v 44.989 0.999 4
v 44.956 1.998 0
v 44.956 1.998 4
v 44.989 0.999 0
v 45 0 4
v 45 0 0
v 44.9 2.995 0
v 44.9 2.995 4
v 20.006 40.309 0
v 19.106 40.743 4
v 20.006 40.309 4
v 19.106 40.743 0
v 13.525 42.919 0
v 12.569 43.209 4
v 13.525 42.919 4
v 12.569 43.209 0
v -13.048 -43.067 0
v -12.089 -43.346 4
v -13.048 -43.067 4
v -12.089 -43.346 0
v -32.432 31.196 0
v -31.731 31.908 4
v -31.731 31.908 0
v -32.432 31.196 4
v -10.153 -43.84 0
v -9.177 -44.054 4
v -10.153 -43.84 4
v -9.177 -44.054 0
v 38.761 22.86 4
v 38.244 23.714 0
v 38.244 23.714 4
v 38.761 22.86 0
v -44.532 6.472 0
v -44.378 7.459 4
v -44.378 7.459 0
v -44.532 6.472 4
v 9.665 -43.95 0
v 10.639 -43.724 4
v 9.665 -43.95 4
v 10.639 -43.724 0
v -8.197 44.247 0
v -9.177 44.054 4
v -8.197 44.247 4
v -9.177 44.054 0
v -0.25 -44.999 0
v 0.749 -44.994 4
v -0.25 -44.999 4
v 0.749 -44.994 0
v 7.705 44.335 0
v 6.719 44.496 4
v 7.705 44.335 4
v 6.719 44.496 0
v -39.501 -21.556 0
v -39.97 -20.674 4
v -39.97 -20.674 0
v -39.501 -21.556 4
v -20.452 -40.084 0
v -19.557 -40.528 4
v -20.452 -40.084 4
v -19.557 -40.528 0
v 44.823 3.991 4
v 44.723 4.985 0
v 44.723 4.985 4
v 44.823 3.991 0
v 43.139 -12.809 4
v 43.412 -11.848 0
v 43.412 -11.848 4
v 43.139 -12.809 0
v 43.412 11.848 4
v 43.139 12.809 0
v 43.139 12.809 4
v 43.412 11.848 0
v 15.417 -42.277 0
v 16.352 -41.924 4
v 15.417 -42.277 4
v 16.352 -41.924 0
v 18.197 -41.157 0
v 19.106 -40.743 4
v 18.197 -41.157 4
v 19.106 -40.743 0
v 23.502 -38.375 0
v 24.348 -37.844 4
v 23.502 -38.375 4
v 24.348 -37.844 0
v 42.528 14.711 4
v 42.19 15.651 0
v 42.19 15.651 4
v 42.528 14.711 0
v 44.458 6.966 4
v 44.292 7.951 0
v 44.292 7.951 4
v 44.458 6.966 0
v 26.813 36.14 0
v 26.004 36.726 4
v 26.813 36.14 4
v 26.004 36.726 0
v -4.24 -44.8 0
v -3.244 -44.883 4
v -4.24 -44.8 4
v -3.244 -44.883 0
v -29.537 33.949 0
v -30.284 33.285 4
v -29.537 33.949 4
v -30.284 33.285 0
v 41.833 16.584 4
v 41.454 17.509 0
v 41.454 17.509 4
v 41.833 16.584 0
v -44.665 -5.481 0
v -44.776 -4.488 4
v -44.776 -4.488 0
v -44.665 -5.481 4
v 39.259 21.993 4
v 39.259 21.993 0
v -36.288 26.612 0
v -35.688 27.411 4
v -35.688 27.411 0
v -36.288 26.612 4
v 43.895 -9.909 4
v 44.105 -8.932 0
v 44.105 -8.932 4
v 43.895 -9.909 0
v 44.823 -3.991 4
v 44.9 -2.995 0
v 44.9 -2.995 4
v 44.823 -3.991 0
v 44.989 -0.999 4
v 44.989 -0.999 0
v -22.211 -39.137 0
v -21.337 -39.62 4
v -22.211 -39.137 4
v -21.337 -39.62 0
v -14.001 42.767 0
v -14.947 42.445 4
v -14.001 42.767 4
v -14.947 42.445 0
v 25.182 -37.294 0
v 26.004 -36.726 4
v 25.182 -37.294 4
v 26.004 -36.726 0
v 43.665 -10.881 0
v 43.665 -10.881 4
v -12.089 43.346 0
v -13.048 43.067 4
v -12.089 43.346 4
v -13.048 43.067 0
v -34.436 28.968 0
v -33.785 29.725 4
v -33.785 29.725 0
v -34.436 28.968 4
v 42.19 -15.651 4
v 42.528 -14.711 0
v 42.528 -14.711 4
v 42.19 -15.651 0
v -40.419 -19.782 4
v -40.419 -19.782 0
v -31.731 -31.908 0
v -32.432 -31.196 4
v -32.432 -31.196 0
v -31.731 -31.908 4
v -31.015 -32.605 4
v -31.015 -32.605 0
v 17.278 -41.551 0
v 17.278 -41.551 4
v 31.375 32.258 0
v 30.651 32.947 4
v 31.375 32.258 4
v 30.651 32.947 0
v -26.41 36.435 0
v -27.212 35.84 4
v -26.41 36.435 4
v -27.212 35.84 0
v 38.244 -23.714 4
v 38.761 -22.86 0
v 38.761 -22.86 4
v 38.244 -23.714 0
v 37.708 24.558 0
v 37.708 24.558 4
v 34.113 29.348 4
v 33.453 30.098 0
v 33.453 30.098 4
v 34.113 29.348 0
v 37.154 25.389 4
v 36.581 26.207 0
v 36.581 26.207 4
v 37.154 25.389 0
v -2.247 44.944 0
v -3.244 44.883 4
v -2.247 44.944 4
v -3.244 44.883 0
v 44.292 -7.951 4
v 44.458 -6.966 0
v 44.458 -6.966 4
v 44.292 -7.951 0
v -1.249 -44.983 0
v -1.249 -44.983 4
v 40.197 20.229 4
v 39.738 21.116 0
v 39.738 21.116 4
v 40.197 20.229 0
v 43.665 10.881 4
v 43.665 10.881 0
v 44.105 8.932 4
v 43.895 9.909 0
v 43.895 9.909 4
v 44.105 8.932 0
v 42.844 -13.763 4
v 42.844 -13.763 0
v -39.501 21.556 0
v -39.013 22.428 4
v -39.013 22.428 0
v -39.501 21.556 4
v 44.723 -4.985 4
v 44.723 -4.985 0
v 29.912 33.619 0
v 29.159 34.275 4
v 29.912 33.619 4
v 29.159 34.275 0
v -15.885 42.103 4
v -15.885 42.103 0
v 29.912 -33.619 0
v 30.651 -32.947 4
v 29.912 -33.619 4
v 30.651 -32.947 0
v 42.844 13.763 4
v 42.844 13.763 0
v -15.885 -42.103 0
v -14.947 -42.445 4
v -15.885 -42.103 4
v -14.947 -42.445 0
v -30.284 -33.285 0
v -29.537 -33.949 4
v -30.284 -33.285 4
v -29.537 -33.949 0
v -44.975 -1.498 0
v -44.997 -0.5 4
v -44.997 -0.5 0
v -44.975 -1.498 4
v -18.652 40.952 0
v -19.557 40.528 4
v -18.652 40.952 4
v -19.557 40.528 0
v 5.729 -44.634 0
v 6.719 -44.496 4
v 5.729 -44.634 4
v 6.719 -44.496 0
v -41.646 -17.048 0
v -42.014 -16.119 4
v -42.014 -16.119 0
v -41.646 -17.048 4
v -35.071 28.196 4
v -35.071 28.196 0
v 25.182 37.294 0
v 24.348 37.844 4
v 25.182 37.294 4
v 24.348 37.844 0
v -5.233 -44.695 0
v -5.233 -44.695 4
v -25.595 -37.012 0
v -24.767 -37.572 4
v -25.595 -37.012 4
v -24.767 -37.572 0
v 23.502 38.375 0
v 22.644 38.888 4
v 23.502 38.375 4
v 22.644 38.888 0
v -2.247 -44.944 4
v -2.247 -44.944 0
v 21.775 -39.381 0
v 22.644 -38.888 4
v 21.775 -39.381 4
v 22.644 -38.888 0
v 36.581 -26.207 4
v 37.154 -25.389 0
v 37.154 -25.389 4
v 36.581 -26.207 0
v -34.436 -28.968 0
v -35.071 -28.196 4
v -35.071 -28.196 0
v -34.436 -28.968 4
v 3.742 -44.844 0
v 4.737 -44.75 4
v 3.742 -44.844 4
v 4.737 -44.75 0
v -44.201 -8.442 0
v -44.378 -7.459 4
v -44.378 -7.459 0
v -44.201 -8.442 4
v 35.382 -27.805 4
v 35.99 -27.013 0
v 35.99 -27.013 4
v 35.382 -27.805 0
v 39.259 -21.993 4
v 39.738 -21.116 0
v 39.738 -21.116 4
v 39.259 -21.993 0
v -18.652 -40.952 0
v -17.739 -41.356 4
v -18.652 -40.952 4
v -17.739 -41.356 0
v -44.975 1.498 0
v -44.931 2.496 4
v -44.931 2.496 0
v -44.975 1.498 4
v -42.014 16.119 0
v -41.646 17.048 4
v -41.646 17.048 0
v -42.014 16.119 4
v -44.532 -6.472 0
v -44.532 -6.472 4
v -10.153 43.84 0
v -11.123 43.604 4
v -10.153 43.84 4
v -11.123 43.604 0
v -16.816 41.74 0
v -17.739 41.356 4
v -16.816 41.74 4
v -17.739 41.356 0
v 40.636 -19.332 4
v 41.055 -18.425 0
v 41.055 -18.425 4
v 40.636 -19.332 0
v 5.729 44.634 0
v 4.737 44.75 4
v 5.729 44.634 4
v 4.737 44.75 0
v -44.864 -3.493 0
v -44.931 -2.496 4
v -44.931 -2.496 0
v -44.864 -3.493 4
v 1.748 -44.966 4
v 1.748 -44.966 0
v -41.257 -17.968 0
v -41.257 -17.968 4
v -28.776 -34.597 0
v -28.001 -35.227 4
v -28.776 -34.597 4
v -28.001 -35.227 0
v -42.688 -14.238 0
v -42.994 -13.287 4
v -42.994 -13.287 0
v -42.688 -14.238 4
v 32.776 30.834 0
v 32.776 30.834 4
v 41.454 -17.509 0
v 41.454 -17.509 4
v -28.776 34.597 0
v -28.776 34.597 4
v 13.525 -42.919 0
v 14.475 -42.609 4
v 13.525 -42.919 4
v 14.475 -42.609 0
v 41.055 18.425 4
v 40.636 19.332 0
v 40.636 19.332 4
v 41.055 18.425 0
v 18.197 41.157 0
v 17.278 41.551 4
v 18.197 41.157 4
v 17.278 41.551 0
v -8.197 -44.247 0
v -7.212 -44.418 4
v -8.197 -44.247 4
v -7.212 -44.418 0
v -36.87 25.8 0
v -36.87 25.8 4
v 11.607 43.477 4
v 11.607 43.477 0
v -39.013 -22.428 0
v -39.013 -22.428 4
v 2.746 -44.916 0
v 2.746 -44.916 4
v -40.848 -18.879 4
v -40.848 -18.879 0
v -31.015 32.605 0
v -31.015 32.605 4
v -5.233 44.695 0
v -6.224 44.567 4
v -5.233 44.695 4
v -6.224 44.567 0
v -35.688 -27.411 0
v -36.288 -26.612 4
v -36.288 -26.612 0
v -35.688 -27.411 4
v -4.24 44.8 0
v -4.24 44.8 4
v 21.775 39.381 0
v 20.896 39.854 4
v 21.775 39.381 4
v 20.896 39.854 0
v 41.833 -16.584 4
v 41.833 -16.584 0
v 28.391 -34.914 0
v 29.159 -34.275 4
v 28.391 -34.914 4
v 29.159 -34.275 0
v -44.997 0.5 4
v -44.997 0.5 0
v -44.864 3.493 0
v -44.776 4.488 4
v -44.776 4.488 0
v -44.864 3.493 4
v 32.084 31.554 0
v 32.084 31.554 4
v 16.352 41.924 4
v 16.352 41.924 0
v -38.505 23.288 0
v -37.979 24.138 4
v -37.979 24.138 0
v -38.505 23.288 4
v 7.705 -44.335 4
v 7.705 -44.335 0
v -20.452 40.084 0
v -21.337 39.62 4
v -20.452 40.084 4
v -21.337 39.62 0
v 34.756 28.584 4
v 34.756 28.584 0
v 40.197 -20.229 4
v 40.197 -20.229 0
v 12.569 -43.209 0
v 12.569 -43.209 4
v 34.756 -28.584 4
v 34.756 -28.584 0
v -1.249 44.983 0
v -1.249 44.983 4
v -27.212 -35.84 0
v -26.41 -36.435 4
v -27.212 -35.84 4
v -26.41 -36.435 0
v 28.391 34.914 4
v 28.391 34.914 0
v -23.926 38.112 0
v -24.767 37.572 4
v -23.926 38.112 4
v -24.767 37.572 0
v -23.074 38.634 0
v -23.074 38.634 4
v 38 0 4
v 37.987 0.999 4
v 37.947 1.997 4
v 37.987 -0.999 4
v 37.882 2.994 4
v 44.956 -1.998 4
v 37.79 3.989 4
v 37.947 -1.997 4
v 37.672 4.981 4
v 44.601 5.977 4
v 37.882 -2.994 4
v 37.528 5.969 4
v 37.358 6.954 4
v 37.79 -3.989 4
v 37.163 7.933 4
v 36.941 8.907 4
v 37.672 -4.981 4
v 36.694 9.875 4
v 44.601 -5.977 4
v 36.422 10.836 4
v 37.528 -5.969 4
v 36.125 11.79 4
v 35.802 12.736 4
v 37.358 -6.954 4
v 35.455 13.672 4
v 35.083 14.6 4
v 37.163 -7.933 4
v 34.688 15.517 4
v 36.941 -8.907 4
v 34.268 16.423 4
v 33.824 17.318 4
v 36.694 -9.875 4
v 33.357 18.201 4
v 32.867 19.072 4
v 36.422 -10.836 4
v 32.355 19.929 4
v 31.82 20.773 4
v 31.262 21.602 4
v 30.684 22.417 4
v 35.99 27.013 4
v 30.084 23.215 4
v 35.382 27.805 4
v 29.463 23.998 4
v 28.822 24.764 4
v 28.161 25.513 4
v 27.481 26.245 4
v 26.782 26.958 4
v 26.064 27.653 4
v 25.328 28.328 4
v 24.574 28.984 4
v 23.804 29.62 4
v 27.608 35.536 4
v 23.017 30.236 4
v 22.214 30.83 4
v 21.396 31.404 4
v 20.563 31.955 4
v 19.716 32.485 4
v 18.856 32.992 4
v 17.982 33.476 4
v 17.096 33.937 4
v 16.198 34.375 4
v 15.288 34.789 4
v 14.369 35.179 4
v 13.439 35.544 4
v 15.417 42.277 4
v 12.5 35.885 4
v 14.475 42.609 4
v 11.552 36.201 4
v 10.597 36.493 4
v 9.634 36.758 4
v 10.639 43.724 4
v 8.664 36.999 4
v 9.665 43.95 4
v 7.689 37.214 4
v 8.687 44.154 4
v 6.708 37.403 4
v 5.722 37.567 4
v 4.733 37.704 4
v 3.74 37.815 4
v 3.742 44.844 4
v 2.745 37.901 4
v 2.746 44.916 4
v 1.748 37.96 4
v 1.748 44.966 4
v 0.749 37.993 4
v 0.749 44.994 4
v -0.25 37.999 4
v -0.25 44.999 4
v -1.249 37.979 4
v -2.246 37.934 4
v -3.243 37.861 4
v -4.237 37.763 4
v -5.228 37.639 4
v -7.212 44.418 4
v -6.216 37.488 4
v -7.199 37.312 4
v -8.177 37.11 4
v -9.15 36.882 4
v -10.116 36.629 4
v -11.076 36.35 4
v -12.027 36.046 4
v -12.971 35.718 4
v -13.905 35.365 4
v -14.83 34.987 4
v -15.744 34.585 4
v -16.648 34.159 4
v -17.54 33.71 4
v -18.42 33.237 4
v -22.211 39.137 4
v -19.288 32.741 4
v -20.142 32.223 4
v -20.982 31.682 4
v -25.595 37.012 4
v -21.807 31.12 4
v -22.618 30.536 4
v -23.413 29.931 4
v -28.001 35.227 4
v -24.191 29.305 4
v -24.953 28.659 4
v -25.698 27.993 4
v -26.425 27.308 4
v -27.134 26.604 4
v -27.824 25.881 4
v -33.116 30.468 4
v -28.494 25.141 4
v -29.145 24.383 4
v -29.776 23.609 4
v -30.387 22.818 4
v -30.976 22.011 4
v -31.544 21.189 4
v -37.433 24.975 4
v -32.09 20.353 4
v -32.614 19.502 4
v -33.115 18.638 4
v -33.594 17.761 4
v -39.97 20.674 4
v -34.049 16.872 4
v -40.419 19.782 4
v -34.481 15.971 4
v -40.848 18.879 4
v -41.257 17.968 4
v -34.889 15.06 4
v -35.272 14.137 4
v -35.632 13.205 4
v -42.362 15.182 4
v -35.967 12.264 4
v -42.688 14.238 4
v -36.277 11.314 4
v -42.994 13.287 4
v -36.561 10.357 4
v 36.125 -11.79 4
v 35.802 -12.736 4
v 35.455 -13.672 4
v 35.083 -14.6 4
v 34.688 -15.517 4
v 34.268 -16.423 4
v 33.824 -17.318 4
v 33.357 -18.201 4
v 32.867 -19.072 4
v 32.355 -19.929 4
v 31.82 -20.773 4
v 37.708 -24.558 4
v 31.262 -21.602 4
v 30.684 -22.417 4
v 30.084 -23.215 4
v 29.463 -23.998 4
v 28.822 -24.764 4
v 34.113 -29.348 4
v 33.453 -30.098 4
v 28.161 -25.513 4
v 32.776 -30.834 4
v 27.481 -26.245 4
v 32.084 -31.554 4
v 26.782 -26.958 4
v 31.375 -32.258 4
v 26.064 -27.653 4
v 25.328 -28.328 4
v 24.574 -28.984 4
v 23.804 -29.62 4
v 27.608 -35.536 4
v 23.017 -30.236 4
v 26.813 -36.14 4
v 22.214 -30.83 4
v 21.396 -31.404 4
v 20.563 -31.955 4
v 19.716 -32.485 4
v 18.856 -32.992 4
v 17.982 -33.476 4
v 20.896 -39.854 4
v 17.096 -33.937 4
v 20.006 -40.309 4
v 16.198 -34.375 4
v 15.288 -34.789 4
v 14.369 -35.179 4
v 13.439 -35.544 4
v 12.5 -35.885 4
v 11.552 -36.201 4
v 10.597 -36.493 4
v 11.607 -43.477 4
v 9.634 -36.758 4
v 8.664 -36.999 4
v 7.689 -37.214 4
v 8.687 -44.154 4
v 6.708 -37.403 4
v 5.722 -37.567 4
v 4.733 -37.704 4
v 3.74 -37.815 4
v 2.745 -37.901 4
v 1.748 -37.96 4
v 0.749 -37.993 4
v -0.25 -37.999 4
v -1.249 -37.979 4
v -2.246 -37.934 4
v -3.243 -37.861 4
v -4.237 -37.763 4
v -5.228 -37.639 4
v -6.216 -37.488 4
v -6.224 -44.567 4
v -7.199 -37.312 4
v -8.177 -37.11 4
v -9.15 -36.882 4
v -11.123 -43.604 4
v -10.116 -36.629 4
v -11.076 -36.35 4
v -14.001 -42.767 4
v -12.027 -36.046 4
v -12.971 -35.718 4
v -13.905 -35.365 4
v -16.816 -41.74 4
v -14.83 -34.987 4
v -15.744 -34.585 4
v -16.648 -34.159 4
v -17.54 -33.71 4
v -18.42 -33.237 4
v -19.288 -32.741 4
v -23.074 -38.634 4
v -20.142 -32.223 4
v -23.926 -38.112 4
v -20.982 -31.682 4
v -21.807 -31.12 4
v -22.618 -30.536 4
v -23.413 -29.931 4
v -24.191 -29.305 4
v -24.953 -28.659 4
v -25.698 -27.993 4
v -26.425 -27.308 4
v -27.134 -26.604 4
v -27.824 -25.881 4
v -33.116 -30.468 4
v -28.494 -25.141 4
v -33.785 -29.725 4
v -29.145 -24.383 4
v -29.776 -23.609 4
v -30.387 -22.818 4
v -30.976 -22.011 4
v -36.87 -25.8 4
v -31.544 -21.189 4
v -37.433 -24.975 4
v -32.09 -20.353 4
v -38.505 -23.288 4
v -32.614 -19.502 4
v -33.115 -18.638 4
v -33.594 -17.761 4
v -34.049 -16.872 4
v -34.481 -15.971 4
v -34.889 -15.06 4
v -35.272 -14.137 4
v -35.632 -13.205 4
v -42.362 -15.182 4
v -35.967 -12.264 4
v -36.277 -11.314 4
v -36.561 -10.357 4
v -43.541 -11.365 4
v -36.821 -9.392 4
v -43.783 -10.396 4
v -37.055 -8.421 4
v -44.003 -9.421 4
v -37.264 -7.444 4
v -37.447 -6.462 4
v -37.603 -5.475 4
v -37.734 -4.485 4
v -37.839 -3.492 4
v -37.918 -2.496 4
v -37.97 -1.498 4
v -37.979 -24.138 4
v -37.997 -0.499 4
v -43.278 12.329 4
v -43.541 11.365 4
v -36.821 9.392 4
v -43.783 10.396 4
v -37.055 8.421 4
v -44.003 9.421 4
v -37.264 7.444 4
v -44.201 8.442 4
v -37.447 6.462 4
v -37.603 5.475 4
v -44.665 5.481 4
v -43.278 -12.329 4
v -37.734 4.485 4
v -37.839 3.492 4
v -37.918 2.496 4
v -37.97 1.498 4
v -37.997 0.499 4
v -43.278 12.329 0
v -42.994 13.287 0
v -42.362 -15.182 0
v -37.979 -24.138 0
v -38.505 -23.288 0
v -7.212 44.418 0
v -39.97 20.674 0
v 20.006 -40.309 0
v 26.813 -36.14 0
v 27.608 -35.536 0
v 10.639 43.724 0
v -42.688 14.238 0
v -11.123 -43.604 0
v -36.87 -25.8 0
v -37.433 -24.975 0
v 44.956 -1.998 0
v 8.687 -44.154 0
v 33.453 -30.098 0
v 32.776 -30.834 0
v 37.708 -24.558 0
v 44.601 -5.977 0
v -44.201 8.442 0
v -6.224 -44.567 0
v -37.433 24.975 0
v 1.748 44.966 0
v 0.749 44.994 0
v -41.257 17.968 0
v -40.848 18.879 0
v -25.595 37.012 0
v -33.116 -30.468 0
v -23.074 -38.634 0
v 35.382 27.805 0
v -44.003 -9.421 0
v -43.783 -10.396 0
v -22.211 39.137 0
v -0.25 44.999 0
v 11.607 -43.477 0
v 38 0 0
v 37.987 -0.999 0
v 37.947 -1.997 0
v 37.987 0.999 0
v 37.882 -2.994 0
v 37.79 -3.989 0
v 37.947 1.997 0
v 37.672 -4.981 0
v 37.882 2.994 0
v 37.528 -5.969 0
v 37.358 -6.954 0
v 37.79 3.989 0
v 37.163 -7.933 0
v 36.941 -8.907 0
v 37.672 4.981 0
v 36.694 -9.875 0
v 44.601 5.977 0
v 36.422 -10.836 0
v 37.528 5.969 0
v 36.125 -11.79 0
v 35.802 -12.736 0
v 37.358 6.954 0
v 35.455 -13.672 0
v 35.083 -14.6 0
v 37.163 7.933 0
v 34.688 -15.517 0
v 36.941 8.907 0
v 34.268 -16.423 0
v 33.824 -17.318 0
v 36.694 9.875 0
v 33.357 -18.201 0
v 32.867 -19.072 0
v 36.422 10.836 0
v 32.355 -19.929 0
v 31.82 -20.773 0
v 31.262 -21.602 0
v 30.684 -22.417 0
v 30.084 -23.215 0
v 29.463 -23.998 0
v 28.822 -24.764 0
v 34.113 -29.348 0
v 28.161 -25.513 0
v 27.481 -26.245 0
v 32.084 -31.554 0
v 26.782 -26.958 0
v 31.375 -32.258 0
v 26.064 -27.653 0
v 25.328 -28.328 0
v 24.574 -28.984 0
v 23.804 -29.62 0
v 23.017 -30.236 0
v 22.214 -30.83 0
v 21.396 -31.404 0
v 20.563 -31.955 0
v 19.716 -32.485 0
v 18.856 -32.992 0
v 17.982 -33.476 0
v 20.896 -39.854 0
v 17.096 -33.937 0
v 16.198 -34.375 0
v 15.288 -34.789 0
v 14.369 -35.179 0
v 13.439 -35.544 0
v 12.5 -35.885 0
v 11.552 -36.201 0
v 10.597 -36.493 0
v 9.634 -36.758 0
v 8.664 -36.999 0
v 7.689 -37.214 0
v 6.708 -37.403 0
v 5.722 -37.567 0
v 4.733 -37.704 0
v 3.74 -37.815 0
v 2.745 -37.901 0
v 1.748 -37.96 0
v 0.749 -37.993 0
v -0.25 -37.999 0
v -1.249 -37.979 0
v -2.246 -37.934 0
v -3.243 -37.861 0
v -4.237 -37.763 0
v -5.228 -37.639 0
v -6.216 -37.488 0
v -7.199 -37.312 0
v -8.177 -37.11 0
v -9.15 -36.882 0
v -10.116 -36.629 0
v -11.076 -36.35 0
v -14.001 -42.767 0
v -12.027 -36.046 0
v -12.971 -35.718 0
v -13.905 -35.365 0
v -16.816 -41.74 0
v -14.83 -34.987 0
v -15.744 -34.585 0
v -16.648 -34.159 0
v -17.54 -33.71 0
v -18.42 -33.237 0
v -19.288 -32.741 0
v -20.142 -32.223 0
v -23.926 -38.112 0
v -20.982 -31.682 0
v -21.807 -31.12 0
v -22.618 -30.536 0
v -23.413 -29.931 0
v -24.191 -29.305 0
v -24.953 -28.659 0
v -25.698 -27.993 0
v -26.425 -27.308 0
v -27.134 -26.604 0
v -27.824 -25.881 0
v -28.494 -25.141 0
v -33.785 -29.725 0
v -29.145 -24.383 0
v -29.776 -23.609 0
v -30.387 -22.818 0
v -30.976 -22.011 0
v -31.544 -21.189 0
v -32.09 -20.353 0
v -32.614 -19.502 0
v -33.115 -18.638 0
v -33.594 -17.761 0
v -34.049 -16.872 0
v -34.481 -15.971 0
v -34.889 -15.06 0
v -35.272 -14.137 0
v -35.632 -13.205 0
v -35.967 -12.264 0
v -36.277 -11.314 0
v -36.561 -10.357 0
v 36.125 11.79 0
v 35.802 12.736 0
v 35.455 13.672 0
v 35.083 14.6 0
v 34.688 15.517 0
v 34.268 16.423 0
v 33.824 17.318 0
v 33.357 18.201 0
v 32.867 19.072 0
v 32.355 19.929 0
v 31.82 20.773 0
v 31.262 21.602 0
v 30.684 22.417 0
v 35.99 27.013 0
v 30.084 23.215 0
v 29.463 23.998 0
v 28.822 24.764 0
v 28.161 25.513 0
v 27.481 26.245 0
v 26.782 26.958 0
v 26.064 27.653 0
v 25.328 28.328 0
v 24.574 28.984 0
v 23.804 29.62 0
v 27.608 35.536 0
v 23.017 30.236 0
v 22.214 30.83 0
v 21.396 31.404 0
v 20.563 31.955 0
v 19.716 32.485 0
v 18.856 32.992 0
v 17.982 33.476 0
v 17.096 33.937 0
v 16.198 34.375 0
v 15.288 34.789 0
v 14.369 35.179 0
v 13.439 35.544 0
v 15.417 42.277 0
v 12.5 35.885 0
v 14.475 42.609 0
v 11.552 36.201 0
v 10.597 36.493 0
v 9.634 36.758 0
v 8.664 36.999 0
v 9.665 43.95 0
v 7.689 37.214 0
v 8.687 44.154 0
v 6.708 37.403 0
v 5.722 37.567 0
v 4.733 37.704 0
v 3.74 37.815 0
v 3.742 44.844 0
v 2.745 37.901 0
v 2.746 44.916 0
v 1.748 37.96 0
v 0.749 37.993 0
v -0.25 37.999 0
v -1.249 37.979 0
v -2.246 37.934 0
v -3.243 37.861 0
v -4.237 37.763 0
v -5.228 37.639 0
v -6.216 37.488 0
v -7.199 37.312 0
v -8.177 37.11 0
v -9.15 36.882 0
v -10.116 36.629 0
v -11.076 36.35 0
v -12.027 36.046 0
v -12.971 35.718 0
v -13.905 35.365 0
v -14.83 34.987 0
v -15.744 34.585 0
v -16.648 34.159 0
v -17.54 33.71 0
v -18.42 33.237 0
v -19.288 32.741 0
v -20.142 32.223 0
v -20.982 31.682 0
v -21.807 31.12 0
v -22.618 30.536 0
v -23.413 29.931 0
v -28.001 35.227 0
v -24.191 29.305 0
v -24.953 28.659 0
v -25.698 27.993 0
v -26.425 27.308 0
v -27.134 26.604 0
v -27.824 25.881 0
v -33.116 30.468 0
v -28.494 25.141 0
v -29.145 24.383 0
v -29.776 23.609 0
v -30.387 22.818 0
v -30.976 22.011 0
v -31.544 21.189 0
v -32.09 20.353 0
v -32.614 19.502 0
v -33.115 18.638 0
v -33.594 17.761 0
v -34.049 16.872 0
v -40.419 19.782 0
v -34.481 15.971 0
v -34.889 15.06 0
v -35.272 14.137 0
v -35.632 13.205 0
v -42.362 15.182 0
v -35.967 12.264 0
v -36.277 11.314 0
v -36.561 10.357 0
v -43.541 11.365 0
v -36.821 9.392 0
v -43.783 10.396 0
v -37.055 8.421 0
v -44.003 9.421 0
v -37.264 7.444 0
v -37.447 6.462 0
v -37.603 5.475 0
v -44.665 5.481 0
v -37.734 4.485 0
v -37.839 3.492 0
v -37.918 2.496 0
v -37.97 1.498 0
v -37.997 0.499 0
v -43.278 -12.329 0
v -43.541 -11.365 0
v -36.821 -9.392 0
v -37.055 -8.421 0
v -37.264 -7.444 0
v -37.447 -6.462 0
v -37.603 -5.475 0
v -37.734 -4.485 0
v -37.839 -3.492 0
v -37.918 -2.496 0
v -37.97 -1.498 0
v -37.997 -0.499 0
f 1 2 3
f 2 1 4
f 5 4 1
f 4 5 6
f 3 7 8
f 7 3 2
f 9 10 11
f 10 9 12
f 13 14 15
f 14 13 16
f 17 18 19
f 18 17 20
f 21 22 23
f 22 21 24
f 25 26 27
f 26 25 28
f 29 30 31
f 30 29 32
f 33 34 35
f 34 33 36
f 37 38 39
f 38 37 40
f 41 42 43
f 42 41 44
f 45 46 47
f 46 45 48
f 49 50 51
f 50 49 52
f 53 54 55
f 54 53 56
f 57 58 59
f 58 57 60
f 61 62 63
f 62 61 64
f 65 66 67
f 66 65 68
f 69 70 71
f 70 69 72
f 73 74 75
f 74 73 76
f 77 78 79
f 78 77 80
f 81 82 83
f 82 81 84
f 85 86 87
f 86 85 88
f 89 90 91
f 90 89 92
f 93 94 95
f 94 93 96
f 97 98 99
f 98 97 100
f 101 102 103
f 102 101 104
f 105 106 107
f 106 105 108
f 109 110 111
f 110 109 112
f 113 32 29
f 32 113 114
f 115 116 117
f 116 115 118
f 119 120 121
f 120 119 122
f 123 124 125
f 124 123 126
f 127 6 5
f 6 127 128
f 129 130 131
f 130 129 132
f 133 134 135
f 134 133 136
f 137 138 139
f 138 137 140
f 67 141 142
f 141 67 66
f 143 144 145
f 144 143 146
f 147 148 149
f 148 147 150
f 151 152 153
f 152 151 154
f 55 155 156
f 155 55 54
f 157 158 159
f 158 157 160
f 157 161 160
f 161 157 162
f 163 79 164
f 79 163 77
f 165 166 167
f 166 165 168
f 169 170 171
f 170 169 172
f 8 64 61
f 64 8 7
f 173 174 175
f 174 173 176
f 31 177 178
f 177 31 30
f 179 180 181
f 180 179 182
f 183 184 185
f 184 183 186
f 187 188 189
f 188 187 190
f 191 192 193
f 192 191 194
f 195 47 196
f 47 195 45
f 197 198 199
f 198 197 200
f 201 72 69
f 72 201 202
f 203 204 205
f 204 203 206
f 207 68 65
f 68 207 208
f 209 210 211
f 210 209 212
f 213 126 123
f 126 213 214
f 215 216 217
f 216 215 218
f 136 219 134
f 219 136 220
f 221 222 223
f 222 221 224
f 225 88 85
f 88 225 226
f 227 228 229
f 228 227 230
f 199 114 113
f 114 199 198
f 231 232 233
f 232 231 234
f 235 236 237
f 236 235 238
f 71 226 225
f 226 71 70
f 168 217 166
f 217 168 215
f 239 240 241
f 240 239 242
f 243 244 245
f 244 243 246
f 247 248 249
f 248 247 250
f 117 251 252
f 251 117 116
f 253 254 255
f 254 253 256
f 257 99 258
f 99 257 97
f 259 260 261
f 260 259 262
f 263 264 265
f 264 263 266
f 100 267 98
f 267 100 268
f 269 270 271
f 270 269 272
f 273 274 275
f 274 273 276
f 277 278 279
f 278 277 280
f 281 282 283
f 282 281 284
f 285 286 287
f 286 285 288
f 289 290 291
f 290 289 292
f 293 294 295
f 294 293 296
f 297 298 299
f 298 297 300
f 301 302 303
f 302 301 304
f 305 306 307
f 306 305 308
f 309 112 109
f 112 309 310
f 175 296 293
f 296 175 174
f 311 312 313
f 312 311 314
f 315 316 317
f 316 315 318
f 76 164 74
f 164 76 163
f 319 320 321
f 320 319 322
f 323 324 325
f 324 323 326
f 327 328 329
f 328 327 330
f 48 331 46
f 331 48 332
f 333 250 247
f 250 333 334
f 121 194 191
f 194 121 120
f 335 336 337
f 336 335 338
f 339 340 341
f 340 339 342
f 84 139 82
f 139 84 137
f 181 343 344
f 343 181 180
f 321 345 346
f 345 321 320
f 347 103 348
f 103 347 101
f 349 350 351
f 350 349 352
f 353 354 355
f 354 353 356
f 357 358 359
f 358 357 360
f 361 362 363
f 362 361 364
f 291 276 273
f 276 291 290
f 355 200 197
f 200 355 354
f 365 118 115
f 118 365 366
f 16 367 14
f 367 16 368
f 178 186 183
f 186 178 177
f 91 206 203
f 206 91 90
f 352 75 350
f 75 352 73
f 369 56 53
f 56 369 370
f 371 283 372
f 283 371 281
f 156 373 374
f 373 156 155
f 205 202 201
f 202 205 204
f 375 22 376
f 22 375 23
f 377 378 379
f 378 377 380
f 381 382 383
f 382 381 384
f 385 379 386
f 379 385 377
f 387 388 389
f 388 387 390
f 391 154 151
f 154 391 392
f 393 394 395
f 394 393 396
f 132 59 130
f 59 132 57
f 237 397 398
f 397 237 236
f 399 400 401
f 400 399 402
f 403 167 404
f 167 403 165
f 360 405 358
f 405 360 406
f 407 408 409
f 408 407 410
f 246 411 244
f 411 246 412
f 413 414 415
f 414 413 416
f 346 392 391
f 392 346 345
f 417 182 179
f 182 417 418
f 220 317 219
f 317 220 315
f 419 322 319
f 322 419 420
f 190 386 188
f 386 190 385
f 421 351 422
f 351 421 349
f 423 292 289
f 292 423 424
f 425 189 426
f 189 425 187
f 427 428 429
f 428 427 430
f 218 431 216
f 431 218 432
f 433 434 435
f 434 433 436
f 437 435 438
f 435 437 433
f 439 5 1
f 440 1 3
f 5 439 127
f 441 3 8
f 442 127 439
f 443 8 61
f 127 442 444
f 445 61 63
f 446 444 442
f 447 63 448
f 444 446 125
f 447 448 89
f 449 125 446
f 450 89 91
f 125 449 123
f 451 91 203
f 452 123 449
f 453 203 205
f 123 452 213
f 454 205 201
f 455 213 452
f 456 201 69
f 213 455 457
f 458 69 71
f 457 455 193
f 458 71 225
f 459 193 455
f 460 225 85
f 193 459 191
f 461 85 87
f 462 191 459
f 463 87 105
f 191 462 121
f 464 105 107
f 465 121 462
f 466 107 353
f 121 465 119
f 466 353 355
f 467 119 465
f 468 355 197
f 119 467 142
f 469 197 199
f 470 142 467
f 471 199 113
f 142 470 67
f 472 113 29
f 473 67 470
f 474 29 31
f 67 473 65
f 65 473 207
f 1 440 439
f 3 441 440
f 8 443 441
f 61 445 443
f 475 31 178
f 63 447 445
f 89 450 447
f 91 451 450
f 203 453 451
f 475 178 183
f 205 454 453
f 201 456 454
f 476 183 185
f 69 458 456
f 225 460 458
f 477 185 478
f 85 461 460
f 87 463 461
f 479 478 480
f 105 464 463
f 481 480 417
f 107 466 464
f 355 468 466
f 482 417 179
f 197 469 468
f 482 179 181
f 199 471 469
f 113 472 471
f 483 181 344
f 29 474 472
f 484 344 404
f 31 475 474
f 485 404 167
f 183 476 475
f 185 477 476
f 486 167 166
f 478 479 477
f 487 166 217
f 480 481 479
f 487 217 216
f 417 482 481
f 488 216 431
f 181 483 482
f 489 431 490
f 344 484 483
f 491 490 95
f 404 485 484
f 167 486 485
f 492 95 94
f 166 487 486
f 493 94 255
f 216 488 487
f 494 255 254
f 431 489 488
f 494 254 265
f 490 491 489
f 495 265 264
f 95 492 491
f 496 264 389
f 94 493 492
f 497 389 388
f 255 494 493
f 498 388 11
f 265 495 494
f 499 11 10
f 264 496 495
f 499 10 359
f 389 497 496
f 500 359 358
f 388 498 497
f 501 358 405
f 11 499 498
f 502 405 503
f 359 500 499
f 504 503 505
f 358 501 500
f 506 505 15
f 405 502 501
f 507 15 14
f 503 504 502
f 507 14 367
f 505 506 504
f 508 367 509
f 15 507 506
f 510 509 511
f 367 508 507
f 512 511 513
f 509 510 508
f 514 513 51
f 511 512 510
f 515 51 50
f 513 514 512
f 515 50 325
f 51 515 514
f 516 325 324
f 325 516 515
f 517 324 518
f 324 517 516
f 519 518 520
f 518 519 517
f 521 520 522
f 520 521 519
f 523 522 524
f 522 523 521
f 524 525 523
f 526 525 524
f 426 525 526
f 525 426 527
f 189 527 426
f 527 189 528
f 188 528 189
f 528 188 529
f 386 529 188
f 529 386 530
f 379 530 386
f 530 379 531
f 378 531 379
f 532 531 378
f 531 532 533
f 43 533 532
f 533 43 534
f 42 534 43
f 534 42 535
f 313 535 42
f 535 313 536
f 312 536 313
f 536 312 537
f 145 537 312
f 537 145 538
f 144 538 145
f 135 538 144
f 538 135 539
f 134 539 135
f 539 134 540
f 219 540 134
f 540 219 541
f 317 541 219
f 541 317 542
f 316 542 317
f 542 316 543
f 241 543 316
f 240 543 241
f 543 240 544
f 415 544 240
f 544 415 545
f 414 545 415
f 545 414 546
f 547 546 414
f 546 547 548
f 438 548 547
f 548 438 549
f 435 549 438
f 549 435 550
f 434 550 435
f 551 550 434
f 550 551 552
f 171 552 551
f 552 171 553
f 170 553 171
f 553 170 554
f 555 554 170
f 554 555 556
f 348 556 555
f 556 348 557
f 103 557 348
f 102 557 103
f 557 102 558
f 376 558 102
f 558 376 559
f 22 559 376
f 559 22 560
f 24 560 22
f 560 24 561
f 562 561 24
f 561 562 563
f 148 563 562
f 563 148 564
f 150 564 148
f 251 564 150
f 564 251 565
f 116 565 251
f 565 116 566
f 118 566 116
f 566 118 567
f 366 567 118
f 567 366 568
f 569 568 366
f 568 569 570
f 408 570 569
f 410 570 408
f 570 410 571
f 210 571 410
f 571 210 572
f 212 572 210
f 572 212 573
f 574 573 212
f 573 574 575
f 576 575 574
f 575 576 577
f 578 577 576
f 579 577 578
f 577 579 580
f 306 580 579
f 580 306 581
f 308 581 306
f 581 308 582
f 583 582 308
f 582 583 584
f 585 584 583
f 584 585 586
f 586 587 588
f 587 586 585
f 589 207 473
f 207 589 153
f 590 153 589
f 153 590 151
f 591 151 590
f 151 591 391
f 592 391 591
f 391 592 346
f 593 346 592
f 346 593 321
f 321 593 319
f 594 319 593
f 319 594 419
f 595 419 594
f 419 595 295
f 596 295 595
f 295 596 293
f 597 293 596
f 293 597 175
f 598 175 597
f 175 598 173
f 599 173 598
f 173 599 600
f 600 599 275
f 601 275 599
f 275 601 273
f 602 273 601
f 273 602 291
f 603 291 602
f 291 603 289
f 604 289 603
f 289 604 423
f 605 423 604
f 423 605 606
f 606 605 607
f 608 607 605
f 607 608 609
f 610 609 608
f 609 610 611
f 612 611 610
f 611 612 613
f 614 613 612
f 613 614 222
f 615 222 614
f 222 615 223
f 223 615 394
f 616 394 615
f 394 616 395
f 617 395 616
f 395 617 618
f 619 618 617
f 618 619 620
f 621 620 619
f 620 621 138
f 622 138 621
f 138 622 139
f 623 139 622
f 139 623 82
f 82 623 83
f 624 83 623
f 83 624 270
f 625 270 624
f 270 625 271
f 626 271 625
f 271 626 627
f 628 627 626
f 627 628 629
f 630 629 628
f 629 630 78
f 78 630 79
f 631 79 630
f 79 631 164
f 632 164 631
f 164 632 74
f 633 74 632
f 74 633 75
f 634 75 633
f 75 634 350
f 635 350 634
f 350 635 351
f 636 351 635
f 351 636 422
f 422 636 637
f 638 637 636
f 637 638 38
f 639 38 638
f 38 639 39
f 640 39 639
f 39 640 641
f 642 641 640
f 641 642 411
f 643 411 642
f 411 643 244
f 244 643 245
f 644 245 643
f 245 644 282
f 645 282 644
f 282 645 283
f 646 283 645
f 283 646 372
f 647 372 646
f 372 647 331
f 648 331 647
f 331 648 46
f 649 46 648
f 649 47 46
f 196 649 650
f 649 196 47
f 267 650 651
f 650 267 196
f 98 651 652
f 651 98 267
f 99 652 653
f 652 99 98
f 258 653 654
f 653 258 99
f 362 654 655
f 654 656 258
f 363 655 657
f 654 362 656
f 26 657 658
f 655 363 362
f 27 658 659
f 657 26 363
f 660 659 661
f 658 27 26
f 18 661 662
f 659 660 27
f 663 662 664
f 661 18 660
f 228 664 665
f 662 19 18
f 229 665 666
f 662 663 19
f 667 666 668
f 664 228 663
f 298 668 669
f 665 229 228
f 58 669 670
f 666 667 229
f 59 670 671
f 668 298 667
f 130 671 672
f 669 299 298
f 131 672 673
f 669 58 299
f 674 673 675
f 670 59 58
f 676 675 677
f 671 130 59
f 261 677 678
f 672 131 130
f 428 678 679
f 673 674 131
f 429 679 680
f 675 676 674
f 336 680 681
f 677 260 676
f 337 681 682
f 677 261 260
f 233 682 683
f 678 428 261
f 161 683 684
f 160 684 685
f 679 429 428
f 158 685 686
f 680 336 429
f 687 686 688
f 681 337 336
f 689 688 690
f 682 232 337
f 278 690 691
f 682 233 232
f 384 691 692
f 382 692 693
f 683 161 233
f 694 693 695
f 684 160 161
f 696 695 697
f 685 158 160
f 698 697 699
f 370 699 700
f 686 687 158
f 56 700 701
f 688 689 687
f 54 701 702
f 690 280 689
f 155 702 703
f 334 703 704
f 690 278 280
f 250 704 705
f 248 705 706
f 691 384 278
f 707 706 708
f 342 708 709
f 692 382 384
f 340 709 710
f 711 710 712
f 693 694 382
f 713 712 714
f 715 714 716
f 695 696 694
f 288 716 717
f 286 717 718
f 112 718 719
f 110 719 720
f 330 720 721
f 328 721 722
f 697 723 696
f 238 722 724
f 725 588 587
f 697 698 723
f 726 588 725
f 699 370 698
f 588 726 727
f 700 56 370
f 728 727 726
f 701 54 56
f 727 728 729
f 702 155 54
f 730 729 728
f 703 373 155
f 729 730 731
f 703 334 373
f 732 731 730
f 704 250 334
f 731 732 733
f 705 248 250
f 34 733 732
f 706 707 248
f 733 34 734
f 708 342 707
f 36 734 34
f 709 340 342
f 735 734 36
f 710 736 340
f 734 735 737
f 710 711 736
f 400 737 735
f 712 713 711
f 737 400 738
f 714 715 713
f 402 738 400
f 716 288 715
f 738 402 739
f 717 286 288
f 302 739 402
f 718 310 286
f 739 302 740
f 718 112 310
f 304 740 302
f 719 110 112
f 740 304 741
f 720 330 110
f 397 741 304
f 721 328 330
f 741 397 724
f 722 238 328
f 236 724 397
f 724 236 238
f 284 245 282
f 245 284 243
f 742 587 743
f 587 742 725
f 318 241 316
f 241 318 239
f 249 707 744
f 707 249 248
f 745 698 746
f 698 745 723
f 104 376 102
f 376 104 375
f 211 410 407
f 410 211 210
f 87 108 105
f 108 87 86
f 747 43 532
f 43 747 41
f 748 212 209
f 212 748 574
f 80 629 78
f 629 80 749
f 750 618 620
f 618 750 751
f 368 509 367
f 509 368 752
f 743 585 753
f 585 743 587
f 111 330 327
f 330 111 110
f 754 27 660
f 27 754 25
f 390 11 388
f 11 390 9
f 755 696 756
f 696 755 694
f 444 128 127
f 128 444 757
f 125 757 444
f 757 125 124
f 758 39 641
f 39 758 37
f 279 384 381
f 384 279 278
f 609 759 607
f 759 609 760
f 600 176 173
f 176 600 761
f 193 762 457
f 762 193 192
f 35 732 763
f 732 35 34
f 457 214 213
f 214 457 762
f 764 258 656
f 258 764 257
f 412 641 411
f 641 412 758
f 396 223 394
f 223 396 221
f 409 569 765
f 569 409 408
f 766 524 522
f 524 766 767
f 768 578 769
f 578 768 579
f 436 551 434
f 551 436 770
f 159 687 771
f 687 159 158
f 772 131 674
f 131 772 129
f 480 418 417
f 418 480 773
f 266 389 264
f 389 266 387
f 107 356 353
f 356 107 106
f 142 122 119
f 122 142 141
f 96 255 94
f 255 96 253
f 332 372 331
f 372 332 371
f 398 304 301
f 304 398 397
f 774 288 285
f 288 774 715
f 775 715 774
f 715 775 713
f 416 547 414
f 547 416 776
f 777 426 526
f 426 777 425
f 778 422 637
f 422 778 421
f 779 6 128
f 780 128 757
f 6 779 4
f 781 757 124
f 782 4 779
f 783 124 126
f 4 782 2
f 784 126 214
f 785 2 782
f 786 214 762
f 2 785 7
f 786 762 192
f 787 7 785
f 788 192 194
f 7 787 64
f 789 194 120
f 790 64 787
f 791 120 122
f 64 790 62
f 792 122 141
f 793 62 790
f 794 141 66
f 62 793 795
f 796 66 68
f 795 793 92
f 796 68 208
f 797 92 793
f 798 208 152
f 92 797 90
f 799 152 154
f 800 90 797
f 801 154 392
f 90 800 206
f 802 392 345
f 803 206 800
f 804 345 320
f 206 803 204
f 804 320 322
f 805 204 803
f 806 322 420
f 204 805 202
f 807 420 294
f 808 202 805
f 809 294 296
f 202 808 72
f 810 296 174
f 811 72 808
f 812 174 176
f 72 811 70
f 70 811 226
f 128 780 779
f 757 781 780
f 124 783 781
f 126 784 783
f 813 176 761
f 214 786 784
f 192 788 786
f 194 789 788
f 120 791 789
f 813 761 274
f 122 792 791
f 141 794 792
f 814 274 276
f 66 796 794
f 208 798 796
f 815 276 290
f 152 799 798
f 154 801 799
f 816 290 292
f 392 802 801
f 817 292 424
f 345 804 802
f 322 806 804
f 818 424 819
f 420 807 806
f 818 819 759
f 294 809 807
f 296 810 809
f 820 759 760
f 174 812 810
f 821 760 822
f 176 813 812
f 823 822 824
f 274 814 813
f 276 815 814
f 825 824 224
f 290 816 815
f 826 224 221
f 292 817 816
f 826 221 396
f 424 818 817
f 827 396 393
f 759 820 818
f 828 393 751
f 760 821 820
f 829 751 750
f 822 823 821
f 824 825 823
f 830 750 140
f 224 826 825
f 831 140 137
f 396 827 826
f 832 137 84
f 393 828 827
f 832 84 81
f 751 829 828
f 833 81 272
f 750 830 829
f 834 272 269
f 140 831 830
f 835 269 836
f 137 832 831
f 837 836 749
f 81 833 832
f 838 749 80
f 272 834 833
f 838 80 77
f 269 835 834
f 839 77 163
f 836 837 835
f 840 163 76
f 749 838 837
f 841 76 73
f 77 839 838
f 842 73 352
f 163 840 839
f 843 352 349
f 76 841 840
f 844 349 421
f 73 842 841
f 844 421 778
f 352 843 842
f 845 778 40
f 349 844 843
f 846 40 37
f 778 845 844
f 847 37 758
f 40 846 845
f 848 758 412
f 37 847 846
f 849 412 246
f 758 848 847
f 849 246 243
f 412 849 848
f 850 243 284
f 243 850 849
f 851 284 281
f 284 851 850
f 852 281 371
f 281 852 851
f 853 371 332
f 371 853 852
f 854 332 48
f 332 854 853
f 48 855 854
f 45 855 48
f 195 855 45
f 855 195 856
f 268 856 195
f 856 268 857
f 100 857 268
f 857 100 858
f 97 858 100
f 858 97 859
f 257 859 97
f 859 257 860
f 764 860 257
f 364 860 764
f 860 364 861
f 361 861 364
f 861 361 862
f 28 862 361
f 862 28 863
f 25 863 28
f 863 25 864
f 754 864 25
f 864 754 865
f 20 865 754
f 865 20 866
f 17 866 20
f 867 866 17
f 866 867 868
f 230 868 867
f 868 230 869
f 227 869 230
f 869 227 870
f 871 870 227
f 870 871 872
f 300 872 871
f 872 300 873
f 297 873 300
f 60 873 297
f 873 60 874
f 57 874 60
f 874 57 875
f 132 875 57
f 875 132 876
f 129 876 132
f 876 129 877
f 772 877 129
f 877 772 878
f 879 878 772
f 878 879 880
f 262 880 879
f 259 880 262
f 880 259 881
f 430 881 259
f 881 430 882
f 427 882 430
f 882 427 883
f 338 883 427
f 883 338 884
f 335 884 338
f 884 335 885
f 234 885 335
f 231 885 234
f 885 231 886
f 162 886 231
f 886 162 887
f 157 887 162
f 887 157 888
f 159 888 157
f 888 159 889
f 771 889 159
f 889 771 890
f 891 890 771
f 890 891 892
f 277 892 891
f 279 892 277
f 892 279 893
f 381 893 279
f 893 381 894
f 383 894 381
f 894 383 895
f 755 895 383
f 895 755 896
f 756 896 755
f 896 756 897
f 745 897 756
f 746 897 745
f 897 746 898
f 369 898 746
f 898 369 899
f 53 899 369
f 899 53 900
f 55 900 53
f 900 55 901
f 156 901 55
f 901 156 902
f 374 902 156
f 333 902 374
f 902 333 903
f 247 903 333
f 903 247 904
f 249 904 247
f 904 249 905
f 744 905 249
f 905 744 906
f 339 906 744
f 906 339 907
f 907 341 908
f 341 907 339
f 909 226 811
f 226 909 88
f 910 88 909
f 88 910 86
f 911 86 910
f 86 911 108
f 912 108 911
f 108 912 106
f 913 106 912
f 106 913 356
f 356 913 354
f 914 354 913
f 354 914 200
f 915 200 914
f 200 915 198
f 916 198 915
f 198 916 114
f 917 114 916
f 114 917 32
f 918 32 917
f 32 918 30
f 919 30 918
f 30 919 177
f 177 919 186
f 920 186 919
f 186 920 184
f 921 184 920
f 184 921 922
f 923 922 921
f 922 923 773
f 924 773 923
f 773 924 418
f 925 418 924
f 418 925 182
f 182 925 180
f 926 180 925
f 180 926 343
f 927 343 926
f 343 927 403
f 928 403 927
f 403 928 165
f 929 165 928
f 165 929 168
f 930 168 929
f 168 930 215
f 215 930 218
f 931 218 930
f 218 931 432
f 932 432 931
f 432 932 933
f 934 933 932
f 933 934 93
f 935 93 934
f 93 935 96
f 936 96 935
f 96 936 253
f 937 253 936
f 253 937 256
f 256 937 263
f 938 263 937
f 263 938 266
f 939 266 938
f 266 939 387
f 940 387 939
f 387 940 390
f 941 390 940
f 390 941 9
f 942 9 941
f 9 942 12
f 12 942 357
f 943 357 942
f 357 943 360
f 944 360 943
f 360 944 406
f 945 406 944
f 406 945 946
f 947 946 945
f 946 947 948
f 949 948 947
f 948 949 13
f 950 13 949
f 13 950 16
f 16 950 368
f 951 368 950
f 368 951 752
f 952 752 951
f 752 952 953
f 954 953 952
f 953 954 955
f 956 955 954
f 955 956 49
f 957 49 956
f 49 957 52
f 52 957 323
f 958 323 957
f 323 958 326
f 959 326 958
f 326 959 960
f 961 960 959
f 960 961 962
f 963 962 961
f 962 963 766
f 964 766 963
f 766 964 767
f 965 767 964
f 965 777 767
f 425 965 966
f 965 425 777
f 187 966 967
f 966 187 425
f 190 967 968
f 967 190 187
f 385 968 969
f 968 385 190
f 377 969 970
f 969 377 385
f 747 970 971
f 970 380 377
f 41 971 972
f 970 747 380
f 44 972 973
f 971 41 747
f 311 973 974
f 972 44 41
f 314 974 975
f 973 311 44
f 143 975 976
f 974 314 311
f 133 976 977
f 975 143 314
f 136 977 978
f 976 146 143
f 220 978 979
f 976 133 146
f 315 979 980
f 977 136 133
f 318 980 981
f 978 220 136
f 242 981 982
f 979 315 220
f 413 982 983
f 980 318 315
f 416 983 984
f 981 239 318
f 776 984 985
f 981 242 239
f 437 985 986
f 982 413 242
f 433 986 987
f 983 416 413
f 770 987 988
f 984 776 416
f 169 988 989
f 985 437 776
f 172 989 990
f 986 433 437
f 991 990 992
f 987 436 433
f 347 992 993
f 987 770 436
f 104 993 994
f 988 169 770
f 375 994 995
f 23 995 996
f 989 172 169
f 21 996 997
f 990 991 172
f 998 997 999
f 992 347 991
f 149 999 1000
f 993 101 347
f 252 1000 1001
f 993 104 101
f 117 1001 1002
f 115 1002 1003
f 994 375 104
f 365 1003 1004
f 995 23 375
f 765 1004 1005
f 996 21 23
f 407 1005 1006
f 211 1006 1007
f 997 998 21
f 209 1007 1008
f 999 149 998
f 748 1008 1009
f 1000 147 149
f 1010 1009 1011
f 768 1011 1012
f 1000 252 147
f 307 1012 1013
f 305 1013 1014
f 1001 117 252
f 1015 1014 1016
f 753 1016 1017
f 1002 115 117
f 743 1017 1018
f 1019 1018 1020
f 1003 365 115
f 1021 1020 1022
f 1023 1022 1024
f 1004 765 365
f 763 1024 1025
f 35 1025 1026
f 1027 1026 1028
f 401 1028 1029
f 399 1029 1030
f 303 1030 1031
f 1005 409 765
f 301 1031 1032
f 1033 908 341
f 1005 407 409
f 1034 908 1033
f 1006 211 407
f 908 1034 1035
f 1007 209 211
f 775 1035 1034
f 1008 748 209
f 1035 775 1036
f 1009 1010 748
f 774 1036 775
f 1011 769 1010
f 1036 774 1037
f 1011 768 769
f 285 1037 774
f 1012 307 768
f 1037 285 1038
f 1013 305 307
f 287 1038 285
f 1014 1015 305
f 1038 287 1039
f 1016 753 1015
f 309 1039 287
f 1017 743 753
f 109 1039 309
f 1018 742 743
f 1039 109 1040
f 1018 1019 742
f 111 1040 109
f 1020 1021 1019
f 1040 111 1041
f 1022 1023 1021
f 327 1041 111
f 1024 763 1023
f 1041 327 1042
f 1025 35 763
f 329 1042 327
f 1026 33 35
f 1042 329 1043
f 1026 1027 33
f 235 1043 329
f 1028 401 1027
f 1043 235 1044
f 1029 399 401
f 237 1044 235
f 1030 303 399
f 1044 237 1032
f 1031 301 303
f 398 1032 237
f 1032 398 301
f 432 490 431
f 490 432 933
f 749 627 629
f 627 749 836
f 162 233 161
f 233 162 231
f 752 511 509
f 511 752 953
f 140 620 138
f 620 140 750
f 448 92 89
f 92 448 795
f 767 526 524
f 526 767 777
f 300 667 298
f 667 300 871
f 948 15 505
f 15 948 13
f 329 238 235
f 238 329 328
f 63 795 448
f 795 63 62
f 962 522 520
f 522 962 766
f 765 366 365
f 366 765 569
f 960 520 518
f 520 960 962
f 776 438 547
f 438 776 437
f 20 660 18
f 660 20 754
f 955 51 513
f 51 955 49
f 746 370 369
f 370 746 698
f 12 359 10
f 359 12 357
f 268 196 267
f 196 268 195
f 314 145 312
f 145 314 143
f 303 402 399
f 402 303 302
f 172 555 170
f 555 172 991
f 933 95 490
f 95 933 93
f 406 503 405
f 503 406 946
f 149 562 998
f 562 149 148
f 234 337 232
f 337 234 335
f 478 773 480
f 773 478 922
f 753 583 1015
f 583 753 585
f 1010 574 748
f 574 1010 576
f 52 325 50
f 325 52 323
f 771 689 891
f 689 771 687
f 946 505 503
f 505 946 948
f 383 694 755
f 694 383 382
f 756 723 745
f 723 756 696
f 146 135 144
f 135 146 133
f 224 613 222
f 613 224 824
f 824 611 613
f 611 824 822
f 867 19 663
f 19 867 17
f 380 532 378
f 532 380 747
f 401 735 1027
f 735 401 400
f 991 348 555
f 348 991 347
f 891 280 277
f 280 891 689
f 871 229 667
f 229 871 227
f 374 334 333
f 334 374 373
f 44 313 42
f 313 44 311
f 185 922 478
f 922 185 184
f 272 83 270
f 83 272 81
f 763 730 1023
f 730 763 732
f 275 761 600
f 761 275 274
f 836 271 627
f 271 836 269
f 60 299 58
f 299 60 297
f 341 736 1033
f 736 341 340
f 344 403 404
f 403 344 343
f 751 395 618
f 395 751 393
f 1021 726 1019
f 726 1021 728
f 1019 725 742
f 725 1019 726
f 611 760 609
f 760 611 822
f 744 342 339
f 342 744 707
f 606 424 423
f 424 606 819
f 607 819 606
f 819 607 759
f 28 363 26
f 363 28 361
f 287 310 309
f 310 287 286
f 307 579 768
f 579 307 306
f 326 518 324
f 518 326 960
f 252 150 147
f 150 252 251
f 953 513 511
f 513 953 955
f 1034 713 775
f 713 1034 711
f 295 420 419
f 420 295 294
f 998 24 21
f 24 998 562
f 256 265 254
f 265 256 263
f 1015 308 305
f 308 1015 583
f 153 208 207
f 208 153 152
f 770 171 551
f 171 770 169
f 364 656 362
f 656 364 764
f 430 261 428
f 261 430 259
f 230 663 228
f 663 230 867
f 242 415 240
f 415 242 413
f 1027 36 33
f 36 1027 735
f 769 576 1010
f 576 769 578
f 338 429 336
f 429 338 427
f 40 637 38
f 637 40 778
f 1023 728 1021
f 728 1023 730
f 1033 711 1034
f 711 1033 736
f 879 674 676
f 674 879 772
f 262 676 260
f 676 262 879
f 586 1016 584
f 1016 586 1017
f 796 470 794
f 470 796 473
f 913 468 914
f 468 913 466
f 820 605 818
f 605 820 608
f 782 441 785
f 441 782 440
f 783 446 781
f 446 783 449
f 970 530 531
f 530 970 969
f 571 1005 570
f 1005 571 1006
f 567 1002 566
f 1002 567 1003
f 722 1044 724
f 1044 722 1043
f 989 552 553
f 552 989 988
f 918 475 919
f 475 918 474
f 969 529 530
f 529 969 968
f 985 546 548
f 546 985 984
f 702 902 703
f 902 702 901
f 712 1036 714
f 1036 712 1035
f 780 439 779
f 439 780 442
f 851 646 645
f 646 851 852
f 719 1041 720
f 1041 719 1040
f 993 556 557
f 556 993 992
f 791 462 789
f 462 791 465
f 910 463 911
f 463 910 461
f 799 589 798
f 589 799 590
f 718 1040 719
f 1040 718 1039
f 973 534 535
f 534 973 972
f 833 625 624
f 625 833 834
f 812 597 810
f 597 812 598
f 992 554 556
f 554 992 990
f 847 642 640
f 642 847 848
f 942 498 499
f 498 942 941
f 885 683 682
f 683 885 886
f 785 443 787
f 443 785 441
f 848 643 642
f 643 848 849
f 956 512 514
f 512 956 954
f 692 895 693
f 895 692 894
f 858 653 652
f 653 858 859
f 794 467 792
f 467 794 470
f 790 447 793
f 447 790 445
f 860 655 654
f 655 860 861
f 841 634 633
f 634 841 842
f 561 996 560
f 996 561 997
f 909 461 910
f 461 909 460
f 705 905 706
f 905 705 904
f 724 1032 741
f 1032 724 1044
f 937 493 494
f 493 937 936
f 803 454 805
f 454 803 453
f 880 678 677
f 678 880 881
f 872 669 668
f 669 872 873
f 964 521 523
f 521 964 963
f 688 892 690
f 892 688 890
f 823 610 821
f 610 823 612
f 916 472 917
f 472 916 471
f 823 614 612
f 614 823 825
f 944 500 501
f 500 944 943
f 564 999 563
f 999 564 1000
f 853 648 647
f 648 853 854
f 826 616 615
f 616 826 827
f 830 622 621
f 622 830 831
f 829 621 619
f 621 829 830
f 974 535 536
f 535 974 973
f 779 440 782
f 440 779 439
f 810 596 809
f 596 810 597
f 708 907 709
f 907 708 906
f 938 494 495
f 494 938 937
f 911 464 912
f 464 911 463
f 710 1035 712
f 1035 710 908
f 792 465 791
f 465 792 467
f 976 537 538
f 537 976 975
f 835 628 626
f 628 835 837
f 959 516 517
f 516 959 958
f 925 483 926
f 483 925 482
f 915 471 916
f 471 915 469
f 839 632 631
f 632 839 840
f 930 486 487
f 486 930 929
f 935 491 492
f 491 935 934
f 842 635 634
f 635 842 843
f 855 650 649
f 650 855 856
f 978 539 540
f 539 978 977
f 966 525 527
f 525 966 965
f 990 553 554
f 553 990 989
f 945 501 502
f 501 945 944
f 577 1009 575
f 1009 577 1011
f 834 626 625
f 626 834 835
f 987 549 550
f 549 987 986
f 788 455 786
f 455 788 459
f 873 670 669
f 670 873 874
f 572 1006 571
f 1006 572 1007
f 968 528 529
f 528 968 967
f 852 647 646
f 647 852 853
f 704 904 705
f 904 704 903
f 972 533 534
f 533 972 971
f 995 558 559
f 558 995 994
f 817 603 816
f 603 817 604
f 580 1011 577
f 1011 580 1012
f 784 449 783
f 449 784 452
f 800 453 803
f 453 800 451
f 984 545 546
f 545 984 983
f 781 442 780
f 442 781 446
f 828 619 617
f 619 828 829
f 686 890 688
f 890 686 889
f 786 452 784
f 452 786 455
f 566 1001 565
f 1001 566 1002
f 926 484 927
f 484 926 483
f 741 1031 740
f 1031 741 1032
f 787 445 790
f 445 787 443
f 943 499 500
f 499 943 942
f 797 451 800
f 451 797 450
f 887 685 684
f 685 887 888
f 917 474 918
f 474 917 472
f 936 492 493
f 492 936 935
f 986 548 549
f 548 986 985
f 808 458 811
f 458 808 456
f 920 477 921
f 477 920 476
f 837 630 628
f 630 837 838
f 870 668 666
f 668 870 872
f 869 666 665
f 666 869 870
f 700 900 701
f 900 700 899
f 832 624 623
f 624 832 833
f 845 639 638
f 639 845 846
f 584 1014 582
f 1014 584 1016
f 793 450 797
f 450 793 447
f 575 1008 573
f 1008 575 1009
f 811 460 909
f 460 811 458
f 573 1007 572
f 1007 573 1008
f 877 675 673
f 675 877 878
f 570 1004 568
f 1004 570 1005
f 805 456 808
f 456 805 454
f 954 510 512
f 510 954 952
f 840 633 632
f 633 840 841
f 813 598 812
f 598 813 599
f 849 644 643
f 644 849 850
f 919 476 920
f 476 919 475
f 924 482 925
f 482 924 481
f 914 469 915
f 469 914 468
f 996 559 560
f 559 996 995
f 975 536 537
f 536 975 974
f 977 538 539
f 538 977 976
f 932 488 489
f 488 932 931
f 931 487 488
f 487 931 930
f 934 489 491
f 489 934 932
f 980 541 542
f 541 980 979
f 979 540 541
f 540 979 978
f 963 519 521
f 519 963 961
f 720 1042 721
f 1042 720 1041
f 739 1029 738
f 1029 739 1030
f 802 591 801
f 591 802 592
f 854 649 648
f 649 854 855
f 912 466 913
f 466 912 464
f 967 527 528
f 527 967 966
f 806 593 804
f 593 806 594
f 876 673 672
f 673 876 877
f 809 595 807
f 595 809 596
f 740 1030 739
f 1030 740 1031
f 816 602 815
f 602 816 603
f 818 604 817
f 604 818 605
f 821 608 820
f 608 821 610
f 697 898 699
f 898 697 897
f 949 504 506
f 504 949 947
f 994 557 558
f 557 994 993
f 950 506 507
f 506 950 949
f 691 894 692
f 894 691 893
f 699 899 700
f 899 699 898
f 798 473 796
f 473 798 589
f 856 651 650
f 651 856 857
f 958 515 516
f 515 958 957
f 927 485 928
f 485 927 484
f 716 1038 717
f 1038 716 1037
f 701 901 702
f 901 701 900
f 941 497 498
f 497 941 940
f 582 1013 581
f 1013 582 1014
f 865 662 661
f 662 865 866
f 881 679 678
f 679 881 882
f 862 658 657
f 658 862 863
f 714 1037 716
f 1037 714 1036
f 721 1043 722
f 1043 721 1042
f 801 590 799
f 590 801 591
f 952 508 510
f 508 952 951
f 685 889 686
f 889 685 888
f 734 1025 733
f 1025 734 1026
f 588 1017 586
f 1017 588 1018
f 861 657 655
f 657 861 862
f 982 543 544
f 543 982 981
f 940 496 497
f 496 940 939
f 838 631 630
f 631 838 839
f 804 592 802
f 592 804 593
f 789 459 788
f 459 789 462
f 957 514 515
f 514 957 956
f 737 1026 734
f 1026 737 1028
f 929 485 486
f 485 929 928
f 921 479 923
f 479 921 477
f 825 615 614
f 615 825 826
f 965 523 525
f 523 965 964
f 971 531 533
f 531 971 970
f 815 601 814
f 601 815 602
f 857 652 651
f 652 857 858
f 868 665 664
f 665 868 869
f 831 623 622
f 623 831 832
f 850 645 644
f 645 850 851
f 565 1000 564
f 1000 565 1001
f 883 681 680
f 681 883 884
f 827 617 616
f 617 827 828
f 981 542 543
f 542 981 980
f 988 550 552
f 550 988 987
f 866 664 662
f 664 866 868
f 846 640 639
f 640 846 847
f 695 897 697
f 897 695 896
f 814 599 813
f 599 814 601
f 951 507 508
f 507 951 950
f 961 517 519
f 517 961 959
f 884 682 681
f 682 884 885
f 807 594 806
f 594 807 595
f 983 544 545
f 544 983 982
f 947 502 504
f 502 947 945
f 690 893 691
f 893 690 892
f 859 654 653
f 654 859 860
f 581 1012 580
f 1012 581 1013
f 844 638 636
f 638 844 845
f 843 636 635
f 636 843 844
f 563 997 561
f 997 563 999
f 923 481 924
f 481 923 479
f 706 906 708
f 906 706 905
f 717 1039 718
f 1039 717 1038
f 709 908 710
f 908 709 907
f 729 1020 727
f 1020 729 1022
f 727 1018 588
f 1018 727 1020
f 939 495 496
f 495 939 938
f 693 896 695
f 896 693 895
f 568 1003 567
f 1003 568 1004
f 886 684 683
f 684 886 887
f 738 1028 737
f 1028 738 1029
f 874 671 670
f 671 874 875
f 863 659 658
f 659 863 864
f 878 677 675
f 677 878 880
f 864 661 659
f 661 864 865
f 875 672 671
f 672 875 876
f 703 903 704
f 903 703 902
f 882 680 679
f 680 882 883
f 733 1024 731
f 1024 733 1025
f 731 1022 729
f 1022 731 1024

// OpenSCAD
/*
 * Simple gasket for glass jars.
 *
 */

ID = 76;
OD = 90;
Width = 4;

$fa = 1;
$fs = 1;

difference(){
    cylinder(r=OD/2, h=Width);
    cylinder(r=ID/2, h=Width);
}
